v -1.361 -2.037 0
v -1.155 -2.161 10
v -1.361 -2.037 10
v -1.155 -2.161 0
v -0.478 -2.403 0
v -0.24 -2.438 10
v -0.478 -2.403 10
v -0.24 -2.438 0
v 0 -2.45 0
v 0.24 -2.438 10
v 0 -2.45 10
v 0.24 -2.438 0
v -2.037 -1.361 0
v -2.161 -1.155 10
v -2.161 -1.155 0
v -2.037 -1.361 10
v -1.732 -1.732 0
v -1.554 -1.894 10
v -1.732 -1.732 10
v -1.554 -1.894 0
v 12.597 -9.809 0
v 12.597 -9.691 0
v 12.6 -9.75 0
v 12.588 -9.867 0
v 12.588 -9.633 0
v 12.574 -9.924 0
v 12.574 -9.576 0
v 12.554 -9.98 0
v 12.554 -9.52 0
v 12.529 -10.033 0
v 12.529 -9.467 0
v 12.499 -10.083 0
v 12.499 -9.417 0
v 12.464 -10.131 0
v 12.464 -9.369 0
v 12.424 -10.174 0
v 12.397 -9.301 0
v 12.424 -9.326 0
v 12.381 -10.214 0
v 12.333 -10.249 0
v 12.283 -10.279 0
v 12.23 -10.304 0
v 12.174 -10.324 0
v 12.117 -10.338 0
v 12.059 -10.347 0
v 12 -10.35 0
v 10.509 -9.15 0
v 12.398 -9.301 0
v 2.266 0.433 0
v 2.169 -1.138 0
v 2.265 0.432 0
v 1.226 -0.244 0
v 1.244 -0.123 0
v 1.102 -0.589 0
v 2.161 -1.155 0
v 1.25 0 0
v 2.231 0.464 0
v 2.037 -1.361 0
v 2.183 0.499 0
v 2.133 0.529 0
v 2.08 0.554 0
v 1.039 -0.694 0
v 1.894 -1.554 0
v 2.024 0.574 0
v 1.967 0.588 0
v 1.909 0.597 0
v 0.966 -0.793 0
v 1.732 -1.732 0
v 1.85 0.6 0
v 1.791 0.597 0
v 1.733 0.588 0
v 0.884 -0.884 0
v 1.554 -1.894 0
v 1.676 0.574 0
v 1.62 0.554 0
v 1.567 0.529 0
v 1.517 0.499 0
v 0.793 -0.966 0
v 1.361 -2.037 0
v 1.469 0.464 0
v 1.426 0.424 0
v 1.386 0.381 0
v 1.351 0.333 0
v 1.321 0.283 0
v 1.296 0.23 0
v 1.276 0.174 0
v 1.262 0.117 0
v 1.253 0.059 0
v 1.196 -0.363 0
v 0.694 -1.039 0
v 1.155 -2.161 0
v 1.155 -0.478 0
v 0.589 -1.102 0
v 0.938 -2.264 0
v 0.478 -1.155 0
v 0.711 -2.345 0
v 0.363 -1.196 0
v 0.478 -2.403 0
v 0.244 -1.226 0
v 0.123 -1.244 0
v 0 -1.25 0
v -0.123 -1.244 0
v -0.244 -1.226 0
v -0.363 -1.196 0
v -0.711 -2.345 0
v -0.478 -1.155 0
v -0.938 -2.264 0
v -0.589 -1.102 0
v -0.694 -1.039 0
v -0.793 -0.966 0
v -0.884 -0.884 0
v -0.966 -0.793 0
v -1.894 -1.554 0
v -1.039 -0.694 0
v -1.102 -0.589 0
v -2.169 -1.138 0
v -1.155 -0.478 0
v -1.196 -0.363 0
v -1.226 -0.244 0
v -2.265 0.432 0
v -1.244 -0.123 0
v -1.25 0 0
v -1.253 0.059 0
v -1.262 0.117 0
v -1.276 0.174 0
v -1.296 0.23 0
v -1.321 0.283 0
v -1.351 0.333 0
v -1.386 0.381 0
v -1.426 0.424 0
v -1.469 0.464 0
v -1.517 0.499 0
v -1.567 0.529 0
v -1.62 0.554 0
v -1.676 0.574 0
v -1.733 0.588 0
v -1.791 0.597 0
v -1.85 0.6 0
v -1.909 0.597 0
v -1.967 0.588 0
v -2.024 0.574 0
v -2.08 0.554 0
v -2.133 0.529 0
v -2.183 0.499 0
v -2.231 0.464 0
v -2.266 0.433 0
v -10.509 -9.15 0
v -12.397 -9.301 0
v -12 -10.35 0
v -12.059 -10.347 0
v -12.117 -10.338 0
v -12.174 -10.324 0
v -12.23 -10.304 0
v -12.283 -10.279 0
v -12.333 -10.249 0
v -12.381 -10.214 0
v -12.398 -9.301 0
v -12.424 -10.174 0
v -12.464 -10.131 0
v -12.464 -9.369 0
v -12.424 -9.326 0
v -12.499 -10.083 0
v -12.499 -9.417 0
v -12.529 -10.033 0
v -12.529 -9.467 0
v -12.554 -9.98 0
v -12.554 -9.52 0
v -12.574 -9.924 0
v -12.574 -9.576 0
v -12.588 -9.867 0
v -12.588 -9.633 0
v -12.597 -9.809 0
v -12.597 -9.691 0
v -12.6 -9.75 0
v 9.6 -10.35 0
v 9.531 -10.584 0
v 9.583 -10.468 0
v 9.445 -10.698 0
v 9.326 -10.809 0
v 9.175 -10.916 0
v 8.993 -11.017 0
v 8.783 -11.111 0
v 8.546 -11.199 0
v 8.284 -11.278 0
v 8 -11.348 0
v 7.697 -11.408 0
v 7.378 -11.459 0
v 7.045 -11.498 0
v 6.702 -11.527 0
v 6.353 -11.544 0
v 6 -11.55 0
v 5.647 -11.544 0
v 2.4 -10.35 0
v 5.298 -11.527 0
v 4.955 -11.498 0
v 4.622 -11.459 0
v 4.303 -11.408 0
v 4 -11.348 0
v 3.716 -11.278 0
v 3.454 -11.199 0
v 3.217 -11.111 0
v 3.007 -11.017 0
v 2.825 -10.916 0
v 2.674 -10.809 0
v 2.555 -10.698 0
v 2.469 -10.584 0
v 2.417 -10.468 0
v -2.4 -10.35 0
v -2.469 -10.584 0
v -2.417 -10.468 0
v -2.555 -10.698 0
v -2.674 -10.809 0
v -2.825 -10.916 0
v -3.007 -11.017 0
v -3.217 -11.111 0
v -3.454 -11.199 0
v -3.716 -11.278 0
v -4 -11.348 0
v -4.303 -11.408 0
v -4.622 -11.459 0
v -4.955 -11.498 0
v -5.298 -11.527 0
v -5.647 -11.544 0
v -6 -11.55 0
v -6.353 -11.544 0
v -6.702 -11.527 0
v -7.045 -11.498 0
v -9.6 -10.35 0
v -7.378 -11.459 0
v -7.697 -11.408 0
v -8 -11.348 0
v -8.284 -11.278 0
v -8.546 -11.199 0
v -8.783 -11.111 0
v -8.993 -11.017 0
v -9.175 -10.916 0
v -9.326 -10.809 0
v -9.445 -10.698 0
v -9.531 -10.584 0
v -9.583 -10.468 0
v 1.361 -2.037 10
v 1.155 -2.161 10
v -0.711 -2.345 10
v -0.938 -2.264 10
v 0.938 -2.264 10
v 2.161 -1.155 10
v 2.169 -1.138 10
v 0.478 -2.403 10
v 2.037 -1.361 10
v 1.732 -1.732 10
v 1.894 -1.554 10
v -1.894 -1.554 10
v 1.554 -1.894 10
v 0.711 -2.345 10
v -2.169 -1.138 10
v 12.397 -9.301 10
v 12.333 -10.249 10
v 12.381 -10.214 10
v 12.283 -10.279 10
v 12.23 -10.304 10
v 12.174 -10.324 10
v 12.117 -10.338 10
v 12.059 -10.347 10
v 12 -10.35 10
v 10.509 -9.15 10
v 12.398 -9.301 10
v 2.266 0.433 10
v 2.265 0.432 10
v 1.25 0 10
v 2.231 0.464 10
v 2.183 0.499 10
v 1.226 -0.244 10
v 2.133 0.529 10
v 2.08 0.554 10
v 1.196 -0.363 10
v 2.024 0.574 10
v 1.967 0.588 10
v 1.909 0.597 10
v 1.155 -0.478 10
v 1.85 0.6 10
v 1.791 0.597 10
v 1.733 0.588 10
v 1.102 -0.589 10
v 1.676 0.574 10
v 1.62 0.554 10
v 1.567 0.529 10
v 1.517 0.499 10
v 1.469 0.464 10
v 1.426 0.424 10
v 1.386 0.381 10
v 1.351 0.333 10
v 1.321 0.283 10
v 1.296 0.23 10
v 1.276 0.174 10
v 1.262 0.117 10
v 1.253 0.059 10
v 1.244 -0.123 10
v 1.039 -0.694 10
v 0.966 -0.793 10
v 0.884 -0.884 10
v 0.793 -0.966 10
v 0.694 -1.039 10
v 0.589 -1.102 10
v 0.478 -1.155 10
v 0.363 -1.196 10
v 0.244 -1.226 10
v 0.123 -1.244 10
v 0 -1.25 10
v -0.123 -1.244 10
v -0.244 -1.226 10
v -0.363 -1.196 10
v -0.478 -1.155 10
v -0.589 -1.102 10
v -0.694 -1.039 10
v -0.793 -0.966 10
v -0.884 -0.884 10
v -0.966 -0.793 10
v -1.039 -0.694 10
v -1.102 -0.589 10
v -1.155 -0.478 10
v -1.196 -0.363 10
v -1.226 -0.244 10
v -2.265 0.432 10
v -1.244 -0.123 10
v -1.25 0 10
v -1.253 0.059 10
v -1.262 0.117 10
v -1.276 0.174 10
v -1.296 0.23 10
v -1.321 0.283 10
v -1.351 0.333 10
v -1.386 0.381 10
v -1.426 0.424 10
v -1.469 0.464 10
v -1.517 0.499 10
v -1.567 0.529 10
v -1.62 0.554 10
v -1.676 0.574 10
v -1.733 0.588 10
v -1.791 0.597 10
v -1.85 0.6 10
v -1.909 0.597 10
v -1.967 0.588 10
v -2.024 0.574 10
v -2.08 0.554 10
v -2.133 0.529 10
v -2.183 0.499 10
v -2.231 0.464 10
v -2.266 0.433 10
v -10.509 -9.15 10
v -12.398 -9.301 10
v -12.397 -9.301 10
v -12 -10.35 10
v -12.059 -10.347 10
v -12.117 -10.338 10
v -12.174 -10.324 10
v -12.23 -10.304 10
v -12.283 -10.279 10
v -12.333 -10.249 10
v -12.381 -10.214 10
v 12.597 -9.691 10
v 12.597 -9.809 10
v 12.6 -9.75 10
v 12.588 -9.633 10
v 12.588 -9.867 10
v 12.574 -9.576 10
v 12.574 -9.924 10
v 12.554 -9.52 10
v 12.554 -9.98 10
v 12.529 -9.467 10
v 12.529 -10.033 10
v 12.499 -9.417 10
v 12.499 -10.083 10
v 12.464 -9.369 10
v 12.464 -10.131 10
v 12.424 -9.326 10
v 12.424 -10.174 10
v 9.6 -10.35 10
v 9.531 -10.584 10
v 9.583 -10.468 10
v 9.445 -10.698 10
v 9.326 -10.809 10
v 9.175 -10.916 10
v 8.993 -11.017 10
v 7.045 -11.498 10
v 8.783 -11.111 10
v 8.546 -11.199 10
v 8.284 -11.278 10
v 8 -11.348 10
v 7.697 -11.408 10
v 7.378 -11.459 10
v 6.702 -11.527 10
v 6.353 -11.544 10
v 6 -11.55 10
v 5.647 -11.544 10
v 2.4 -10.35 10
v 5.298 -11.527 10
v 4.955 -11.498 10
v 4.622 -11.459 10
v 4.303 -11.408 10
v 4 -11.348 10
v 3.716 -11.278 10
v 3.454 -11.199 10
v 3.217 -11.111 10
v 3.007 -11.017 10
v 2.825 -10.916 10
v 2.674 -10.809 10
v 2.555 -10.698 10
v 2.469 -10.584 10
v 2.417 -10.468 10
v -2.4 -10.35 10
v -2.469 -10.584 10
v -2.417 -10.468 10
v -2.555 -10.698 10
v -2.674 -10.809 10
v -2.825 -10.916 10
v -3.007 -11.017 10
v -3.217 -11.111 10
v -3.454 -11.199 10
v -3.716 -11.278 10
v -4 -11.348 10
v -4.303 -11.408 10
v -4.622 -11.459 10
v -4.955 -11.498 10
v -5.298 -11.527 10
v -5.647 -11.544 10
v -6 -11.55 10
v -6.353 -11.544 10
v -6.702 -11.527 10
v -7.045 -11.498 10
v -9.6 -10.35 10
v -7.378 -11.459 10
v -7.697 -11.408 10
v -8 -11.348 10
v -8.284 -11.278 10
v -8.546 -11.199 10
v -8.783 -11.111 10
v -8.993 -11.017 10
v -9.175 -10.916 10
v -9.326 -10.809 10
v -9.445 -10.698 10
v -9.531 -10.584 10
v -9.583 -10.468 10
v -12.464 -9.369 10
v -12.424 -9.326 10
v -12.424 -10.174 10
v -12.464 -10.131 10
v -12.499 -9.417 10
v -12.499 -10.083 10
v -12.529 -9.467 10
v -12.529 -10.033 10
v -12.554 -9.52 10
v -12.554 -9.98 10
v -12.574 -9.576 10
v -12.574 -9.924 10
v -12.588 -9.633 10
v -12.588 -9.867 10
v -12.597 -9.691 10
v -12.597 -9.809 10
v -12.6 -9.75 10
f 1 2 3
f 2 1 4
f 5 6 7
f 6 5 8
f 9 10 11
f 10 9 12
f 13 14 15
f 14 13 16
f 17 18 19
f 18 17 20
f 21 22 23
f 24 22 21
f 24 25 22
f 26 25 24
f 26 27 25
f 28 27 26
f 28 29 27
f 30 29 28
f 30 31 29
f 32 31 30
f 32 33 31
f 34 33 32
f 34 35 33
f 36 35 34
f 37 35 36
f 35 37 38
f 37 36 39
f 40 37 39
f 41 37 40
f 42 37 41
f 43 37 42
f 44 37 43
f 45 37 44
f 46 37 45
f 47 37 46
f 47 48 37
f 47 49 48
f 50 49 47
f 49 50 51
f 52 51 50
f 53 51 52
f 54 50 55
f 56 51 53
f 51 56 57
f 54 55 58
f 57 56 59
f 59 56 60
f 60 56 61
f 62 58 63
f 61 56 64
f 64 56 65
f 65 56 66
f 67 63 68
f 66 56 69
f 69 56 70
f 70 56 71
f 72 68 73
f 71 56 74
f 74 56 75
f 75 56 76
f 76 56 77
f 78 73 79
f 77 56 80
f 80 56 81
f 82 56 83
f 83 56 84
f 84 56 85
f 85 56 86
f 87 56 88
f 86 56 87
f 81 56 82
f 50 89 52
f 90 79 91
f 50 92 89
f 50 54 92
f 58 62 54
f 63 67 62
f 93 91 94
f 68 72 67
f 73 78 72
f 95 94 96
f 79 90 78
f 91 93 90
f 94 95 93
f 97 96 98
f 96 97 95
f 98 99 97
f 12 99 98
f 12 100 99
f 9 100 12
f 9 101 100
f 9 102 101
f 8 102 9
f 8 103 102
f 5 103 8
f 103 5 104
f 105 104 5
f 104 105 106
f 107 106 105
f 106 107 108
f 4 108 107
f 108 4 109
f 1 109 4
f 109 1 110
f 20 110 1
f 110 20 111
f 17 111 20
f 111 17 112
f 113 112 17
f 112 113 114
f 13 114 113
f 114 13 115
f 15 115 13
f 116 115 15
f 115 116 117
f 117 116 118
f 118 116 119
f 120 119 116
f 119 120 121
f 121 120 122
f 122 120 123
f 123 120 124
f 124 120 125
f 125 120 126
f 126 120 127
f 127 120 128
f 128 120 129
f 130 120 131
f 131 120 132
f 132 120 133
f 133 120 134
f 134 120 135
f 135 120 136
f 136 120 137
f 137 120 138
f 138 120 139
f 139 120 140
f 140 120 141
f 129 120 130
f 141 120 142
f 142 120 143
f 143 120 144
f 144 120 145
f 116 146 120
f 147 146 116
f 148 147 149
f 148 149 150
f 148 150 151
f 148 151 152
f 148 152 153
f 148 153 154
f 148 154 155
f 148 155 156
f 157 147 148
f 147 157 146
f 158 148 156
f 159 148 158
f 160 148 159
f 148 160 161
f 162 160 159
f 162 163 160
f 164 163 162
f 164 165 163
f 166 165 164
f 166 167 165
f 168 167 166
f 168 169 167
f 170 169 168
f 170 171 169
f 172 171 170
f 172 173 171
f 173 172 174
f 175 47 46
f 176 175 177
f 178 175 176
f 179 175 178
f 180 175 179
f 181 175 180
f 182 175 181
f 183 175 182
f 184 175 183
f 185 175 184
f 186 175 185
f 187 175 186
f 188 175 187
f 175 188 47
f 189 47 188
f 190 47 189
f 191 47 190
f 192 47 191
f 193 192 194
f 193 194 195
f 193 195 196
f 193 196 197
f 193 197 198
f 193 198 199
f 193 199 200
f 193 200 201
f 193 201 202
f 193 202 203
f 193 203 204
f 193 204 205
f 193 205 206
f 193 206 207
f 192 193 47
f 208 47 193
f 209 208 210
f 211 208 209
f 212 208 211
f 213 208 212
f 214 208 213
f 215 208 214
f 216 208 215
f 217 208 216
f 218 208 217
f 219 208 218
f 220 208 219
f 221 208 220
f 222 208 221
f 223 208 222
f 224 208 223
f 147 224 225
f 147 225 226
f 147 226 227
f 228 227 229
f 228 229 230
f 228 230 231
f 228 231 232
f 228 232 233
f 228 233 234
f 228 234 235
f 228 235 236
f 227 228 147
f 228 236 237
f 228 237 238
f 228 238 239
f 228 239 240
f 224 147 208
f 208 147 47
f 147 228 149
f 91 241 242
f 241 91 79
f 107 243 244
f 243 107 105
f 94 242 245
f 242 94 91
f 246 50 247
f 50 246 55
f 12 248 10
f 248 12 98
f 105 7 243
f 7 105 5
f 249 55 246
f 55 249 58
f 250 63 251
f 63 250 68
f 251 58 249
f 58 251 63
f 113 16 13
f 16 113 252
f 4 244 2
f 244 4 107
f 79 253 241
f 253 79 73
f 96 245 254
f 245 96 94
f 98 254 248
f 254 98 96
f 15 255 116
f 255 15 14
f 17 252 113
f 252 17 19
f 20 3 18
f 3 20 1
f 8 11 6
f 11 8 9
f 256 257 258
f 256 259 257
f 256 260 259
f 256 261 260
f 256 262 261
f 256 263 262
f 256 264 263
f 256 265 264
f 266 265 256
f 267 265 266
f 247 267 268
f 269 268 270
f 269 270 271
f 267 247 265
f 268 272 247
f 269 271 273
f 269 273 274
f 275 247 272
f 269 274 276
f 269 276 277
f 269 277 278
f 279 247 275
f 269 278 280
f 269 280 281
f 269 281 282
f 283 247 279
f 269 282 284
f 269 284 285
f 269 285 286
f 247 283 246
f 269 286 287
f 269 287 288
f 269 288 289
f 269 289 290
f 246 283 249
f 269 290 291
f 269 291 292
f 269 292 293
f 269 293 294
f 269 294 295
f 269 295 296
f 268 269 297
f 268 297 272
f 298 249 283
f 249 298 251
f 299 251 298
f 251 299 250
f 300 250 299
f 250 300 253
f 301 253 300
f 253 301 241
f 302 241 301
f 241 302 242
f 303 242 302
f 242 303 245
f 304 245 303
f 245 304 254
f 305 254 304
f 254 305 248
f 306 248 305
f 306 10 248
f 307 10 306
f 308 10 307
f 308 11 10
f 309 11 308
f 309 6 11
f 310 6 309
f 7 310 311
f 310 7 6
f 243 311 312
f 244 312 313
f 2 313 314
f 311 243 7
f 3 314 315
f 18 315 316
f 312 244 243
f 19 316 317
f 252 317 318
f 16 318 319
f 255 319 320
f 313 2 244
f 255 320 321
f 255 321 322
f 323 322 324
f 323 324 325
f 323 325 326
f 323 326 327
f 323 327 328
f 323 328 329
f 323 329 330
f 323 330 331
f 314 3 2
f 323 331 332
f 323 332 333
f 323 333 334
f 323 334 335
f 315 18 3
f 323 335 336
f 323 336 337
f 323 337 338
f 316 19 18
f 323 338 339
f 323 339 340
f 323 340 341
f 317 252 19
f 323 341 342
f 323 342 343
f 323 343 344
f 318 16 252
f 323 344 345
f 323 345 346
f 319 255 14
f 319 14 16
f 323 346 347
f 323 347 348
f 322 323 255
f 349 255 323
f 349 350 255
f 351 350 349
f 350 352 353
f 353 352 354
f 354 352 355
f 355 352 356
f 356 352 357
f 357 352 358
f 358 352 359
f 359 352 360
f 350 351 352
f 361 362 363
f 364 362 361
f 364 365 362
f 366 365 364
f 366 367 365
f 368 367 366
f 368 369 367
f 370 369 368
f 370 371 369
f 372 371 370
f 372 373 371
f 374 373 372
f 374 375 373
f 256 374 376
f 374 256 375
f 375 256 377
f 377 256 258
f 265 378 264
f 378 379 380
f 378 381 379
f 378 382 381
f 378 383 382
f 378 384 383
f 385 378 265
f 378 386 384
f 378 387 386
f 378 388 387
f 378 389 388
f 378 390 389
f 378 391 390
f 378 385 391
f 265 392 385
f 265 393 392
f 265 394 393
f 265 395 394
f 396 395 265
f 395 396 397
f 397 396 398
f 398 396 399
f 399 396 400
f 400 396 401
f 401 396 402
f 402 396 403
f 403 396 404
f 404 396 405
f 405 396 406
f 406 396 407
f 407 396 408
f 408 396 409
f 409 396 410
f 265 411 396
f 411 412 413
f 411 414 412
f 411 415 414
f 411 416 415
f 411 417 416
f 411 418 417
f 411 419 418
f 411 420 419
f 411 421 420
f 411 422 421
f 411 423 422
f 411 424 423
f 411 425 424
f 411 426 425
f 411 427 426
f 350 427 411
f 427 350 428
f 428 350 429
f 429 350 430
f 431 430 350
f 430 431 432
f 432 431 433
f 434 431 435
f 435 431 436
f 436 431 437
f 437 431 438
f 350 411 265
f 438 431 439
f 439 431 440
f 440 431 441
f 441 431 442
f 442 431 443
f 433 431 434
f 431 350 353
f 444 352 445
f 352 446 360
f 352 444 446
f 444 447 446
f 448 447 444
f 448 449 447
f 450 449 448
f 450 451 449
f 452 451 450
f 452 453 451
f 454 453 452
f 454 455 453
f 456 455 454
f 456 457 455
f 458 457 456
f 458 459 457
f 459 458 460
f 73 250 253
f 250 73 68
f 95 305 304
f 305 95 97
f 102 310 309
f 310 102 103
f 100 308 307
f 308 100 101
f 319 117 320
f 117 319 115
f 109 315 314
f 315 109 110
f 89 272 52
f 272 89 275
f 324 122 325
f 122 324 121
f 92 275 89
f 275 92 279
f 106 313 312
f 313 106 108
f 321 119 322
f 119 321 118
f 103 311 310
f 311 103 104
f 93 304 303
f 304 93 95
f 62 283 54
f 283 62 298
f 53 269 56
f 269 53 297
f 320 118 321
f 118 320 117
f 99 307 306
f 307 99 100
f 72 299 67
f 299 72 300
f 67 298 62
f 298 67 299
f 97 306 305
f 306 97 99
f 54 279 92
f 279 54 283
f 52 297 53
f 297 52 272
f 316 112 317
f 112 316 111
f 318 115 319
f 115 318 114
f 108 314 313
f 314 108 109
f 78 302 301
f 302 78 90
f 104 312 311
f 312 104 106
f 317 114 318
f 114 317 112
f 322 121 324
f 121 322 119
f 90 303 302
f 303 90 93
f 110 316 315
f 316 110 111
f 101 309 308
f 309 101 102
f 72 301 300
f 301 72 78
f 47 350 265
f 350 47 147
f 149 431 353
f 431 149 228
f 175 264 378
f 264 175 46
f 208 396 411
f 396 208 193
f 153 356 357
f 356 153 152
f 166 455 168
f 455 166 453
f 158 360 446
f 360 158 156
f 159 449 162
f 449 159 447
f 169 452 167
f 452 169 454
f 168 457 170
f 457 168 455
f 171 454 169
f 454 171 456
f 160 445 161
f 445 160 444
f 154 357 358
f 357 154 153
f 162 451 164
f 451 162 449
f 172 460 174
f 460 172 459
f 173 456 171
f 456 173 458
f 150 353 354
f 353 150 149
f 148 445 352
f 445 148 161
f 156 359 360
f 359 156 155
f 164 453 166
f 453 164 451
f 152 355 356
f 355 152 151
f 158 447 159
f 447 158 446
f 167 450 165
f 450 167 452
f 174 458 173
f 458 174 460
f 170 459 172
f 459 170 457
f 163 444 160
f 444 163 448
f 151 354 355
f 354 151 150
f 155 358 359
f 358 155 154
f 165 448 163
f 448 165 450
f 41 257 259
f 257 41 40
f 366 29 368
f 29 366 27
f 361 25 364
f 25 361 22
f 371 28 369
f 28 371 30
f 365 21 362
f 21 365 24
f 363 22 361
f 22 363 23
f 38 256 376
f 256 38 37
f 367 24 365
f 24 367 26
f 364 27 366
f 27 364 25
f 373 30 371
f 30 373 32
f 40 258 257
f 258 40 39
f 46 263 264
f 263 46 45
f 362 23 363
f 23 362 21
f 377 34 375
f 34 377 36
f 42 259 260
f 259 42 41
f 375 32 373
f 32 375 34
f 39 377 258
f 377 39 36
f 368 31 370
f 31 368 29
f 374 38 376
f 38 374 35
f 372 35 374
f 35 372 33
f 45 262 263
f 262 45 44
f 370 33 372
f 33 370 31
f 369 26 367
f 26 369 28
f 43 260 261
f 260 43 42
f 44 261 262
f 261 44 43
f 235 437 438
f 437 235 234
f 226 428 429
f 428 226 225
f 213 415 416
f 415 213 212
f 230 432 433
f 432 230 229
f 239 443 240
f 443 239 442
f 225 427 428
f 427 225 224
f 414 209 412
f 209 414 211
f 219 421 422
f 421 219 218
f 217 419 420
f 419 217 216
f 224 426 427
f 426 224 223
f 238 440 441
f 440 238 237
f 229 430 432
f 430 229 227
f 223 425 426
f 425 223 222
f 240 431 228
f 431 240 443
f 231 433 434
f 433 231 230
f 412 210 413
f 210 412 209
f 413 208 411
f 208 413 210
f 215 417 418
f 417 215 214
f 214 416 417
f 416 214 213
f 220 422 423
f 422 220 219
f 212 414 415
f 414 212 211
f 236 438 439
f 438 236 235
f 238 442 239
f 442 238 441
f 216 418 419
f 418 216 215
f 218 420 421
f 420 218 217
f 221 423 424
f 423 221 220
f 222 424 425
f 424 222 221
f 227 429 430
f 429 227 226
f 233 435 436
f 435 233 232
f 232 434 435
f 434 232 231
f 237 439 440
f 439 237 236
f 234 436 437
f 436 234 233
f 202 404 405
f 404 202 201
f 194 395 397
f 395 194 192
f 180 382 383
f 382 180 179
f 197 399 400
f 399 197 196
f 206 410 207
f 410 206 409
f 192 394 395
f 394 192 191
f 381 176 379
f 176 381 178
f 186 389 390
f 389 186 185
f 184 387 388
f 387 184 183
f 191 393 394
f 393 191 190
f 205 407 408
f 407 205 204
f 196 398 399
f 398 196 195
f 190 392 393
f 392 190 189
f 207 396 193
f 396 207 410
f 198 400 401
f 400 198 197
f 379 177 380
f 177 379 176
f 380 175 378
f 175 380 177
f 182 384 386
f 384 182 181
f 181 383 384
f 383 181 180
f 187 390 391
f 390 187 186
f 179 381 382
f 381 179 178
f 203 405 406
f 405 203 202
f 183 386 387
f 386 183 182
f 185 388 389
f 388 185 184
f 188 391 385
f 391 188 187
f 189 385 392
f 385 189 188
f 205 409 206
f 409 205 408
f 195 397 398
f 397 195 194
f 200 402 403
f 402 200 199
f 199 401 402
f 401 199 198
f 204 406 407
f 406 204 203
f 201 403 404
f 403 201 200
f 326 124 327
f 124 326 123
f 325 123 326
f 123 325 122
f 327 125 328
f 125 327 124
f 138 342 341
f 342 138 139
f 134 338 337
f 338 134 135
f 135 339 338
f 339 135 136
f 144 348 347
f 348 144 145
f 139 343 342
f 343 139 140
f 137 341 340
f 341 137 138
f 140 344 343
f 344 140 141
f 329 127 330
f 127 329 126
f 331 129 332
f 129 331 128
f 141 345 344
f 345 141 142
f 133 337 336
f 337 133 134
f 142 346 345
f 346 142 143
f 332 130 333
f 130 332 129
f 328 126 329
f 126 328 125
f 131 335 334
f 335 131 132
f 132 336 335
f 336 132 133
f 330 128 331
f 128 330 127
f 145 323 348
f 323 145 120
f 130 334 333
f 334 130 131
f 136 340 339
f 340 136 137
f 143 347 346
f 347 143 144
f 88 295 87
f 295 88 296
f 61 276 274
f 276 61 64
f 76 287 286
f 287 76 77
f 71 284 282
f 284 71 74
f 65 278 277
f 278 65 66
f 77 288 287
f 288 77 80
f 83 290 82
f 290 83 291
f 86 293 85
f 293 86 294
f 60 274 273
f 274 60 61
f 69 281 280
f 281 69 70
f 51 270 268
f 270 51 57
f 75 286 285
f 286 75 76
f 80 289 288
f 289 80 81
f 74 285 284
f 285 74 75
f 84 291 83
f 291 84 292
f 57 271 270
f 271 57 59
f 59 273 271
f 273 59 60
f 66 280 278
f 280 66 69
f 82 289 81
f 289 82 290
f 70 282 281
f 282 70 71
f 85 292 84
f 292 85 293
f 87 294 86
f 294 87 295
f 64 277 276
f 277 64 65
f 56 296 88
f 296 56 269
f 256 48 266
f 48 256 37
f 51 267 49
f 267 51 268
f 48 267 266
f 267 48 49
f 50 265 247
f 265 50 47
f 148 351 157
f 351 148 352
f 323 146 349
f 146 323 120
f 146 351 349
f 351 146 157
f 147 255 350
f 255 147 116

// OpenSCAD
t=1.2;
w=10;
r=1.25;

//11.6
//28

$fn=64;


difference() {
  cylinder(r=r+t,h=w);
  translate([0,0,-0.1]) cylinder(r=r,h=w+0.2);
  translate([-10,0,-0.1]) cube([20,20,w+0.2]);
}

translate([-r-t/2,0,0]) cylinder(r=t/2,h=w);
translate([r+t/2,0,0]) cylinder(r=t/2,h=w);
translate([-12,-11.6+1.25,0]) {
  cube([24,t,w]);
  translate([0,t/2,0]) cylinder(r=t/2,h=w);
  translate([24,t/2,0]) cylinder(r=t/2,h=w);
  translate([6,0,0]) scale([3,1,1]) cylinder(r=t,h=w);
  translate([18,0,0]) scale([3,1,1]) cylinder(r=t,h=w);
}

translate([r+t/2,0,0]) rotate([0,0,-43.85]) translate([0,-t/2,0]) cube([14.05,t,w]);
mirror([1,0,0]) translate([r+t/2,0,0]) rotate([0,0,-43.85]) translate([0,-t/2,0]) cube([14.05,t,w]);


// translate([0,-11.6+1.25,0]) cube([2,11.6,2]);
